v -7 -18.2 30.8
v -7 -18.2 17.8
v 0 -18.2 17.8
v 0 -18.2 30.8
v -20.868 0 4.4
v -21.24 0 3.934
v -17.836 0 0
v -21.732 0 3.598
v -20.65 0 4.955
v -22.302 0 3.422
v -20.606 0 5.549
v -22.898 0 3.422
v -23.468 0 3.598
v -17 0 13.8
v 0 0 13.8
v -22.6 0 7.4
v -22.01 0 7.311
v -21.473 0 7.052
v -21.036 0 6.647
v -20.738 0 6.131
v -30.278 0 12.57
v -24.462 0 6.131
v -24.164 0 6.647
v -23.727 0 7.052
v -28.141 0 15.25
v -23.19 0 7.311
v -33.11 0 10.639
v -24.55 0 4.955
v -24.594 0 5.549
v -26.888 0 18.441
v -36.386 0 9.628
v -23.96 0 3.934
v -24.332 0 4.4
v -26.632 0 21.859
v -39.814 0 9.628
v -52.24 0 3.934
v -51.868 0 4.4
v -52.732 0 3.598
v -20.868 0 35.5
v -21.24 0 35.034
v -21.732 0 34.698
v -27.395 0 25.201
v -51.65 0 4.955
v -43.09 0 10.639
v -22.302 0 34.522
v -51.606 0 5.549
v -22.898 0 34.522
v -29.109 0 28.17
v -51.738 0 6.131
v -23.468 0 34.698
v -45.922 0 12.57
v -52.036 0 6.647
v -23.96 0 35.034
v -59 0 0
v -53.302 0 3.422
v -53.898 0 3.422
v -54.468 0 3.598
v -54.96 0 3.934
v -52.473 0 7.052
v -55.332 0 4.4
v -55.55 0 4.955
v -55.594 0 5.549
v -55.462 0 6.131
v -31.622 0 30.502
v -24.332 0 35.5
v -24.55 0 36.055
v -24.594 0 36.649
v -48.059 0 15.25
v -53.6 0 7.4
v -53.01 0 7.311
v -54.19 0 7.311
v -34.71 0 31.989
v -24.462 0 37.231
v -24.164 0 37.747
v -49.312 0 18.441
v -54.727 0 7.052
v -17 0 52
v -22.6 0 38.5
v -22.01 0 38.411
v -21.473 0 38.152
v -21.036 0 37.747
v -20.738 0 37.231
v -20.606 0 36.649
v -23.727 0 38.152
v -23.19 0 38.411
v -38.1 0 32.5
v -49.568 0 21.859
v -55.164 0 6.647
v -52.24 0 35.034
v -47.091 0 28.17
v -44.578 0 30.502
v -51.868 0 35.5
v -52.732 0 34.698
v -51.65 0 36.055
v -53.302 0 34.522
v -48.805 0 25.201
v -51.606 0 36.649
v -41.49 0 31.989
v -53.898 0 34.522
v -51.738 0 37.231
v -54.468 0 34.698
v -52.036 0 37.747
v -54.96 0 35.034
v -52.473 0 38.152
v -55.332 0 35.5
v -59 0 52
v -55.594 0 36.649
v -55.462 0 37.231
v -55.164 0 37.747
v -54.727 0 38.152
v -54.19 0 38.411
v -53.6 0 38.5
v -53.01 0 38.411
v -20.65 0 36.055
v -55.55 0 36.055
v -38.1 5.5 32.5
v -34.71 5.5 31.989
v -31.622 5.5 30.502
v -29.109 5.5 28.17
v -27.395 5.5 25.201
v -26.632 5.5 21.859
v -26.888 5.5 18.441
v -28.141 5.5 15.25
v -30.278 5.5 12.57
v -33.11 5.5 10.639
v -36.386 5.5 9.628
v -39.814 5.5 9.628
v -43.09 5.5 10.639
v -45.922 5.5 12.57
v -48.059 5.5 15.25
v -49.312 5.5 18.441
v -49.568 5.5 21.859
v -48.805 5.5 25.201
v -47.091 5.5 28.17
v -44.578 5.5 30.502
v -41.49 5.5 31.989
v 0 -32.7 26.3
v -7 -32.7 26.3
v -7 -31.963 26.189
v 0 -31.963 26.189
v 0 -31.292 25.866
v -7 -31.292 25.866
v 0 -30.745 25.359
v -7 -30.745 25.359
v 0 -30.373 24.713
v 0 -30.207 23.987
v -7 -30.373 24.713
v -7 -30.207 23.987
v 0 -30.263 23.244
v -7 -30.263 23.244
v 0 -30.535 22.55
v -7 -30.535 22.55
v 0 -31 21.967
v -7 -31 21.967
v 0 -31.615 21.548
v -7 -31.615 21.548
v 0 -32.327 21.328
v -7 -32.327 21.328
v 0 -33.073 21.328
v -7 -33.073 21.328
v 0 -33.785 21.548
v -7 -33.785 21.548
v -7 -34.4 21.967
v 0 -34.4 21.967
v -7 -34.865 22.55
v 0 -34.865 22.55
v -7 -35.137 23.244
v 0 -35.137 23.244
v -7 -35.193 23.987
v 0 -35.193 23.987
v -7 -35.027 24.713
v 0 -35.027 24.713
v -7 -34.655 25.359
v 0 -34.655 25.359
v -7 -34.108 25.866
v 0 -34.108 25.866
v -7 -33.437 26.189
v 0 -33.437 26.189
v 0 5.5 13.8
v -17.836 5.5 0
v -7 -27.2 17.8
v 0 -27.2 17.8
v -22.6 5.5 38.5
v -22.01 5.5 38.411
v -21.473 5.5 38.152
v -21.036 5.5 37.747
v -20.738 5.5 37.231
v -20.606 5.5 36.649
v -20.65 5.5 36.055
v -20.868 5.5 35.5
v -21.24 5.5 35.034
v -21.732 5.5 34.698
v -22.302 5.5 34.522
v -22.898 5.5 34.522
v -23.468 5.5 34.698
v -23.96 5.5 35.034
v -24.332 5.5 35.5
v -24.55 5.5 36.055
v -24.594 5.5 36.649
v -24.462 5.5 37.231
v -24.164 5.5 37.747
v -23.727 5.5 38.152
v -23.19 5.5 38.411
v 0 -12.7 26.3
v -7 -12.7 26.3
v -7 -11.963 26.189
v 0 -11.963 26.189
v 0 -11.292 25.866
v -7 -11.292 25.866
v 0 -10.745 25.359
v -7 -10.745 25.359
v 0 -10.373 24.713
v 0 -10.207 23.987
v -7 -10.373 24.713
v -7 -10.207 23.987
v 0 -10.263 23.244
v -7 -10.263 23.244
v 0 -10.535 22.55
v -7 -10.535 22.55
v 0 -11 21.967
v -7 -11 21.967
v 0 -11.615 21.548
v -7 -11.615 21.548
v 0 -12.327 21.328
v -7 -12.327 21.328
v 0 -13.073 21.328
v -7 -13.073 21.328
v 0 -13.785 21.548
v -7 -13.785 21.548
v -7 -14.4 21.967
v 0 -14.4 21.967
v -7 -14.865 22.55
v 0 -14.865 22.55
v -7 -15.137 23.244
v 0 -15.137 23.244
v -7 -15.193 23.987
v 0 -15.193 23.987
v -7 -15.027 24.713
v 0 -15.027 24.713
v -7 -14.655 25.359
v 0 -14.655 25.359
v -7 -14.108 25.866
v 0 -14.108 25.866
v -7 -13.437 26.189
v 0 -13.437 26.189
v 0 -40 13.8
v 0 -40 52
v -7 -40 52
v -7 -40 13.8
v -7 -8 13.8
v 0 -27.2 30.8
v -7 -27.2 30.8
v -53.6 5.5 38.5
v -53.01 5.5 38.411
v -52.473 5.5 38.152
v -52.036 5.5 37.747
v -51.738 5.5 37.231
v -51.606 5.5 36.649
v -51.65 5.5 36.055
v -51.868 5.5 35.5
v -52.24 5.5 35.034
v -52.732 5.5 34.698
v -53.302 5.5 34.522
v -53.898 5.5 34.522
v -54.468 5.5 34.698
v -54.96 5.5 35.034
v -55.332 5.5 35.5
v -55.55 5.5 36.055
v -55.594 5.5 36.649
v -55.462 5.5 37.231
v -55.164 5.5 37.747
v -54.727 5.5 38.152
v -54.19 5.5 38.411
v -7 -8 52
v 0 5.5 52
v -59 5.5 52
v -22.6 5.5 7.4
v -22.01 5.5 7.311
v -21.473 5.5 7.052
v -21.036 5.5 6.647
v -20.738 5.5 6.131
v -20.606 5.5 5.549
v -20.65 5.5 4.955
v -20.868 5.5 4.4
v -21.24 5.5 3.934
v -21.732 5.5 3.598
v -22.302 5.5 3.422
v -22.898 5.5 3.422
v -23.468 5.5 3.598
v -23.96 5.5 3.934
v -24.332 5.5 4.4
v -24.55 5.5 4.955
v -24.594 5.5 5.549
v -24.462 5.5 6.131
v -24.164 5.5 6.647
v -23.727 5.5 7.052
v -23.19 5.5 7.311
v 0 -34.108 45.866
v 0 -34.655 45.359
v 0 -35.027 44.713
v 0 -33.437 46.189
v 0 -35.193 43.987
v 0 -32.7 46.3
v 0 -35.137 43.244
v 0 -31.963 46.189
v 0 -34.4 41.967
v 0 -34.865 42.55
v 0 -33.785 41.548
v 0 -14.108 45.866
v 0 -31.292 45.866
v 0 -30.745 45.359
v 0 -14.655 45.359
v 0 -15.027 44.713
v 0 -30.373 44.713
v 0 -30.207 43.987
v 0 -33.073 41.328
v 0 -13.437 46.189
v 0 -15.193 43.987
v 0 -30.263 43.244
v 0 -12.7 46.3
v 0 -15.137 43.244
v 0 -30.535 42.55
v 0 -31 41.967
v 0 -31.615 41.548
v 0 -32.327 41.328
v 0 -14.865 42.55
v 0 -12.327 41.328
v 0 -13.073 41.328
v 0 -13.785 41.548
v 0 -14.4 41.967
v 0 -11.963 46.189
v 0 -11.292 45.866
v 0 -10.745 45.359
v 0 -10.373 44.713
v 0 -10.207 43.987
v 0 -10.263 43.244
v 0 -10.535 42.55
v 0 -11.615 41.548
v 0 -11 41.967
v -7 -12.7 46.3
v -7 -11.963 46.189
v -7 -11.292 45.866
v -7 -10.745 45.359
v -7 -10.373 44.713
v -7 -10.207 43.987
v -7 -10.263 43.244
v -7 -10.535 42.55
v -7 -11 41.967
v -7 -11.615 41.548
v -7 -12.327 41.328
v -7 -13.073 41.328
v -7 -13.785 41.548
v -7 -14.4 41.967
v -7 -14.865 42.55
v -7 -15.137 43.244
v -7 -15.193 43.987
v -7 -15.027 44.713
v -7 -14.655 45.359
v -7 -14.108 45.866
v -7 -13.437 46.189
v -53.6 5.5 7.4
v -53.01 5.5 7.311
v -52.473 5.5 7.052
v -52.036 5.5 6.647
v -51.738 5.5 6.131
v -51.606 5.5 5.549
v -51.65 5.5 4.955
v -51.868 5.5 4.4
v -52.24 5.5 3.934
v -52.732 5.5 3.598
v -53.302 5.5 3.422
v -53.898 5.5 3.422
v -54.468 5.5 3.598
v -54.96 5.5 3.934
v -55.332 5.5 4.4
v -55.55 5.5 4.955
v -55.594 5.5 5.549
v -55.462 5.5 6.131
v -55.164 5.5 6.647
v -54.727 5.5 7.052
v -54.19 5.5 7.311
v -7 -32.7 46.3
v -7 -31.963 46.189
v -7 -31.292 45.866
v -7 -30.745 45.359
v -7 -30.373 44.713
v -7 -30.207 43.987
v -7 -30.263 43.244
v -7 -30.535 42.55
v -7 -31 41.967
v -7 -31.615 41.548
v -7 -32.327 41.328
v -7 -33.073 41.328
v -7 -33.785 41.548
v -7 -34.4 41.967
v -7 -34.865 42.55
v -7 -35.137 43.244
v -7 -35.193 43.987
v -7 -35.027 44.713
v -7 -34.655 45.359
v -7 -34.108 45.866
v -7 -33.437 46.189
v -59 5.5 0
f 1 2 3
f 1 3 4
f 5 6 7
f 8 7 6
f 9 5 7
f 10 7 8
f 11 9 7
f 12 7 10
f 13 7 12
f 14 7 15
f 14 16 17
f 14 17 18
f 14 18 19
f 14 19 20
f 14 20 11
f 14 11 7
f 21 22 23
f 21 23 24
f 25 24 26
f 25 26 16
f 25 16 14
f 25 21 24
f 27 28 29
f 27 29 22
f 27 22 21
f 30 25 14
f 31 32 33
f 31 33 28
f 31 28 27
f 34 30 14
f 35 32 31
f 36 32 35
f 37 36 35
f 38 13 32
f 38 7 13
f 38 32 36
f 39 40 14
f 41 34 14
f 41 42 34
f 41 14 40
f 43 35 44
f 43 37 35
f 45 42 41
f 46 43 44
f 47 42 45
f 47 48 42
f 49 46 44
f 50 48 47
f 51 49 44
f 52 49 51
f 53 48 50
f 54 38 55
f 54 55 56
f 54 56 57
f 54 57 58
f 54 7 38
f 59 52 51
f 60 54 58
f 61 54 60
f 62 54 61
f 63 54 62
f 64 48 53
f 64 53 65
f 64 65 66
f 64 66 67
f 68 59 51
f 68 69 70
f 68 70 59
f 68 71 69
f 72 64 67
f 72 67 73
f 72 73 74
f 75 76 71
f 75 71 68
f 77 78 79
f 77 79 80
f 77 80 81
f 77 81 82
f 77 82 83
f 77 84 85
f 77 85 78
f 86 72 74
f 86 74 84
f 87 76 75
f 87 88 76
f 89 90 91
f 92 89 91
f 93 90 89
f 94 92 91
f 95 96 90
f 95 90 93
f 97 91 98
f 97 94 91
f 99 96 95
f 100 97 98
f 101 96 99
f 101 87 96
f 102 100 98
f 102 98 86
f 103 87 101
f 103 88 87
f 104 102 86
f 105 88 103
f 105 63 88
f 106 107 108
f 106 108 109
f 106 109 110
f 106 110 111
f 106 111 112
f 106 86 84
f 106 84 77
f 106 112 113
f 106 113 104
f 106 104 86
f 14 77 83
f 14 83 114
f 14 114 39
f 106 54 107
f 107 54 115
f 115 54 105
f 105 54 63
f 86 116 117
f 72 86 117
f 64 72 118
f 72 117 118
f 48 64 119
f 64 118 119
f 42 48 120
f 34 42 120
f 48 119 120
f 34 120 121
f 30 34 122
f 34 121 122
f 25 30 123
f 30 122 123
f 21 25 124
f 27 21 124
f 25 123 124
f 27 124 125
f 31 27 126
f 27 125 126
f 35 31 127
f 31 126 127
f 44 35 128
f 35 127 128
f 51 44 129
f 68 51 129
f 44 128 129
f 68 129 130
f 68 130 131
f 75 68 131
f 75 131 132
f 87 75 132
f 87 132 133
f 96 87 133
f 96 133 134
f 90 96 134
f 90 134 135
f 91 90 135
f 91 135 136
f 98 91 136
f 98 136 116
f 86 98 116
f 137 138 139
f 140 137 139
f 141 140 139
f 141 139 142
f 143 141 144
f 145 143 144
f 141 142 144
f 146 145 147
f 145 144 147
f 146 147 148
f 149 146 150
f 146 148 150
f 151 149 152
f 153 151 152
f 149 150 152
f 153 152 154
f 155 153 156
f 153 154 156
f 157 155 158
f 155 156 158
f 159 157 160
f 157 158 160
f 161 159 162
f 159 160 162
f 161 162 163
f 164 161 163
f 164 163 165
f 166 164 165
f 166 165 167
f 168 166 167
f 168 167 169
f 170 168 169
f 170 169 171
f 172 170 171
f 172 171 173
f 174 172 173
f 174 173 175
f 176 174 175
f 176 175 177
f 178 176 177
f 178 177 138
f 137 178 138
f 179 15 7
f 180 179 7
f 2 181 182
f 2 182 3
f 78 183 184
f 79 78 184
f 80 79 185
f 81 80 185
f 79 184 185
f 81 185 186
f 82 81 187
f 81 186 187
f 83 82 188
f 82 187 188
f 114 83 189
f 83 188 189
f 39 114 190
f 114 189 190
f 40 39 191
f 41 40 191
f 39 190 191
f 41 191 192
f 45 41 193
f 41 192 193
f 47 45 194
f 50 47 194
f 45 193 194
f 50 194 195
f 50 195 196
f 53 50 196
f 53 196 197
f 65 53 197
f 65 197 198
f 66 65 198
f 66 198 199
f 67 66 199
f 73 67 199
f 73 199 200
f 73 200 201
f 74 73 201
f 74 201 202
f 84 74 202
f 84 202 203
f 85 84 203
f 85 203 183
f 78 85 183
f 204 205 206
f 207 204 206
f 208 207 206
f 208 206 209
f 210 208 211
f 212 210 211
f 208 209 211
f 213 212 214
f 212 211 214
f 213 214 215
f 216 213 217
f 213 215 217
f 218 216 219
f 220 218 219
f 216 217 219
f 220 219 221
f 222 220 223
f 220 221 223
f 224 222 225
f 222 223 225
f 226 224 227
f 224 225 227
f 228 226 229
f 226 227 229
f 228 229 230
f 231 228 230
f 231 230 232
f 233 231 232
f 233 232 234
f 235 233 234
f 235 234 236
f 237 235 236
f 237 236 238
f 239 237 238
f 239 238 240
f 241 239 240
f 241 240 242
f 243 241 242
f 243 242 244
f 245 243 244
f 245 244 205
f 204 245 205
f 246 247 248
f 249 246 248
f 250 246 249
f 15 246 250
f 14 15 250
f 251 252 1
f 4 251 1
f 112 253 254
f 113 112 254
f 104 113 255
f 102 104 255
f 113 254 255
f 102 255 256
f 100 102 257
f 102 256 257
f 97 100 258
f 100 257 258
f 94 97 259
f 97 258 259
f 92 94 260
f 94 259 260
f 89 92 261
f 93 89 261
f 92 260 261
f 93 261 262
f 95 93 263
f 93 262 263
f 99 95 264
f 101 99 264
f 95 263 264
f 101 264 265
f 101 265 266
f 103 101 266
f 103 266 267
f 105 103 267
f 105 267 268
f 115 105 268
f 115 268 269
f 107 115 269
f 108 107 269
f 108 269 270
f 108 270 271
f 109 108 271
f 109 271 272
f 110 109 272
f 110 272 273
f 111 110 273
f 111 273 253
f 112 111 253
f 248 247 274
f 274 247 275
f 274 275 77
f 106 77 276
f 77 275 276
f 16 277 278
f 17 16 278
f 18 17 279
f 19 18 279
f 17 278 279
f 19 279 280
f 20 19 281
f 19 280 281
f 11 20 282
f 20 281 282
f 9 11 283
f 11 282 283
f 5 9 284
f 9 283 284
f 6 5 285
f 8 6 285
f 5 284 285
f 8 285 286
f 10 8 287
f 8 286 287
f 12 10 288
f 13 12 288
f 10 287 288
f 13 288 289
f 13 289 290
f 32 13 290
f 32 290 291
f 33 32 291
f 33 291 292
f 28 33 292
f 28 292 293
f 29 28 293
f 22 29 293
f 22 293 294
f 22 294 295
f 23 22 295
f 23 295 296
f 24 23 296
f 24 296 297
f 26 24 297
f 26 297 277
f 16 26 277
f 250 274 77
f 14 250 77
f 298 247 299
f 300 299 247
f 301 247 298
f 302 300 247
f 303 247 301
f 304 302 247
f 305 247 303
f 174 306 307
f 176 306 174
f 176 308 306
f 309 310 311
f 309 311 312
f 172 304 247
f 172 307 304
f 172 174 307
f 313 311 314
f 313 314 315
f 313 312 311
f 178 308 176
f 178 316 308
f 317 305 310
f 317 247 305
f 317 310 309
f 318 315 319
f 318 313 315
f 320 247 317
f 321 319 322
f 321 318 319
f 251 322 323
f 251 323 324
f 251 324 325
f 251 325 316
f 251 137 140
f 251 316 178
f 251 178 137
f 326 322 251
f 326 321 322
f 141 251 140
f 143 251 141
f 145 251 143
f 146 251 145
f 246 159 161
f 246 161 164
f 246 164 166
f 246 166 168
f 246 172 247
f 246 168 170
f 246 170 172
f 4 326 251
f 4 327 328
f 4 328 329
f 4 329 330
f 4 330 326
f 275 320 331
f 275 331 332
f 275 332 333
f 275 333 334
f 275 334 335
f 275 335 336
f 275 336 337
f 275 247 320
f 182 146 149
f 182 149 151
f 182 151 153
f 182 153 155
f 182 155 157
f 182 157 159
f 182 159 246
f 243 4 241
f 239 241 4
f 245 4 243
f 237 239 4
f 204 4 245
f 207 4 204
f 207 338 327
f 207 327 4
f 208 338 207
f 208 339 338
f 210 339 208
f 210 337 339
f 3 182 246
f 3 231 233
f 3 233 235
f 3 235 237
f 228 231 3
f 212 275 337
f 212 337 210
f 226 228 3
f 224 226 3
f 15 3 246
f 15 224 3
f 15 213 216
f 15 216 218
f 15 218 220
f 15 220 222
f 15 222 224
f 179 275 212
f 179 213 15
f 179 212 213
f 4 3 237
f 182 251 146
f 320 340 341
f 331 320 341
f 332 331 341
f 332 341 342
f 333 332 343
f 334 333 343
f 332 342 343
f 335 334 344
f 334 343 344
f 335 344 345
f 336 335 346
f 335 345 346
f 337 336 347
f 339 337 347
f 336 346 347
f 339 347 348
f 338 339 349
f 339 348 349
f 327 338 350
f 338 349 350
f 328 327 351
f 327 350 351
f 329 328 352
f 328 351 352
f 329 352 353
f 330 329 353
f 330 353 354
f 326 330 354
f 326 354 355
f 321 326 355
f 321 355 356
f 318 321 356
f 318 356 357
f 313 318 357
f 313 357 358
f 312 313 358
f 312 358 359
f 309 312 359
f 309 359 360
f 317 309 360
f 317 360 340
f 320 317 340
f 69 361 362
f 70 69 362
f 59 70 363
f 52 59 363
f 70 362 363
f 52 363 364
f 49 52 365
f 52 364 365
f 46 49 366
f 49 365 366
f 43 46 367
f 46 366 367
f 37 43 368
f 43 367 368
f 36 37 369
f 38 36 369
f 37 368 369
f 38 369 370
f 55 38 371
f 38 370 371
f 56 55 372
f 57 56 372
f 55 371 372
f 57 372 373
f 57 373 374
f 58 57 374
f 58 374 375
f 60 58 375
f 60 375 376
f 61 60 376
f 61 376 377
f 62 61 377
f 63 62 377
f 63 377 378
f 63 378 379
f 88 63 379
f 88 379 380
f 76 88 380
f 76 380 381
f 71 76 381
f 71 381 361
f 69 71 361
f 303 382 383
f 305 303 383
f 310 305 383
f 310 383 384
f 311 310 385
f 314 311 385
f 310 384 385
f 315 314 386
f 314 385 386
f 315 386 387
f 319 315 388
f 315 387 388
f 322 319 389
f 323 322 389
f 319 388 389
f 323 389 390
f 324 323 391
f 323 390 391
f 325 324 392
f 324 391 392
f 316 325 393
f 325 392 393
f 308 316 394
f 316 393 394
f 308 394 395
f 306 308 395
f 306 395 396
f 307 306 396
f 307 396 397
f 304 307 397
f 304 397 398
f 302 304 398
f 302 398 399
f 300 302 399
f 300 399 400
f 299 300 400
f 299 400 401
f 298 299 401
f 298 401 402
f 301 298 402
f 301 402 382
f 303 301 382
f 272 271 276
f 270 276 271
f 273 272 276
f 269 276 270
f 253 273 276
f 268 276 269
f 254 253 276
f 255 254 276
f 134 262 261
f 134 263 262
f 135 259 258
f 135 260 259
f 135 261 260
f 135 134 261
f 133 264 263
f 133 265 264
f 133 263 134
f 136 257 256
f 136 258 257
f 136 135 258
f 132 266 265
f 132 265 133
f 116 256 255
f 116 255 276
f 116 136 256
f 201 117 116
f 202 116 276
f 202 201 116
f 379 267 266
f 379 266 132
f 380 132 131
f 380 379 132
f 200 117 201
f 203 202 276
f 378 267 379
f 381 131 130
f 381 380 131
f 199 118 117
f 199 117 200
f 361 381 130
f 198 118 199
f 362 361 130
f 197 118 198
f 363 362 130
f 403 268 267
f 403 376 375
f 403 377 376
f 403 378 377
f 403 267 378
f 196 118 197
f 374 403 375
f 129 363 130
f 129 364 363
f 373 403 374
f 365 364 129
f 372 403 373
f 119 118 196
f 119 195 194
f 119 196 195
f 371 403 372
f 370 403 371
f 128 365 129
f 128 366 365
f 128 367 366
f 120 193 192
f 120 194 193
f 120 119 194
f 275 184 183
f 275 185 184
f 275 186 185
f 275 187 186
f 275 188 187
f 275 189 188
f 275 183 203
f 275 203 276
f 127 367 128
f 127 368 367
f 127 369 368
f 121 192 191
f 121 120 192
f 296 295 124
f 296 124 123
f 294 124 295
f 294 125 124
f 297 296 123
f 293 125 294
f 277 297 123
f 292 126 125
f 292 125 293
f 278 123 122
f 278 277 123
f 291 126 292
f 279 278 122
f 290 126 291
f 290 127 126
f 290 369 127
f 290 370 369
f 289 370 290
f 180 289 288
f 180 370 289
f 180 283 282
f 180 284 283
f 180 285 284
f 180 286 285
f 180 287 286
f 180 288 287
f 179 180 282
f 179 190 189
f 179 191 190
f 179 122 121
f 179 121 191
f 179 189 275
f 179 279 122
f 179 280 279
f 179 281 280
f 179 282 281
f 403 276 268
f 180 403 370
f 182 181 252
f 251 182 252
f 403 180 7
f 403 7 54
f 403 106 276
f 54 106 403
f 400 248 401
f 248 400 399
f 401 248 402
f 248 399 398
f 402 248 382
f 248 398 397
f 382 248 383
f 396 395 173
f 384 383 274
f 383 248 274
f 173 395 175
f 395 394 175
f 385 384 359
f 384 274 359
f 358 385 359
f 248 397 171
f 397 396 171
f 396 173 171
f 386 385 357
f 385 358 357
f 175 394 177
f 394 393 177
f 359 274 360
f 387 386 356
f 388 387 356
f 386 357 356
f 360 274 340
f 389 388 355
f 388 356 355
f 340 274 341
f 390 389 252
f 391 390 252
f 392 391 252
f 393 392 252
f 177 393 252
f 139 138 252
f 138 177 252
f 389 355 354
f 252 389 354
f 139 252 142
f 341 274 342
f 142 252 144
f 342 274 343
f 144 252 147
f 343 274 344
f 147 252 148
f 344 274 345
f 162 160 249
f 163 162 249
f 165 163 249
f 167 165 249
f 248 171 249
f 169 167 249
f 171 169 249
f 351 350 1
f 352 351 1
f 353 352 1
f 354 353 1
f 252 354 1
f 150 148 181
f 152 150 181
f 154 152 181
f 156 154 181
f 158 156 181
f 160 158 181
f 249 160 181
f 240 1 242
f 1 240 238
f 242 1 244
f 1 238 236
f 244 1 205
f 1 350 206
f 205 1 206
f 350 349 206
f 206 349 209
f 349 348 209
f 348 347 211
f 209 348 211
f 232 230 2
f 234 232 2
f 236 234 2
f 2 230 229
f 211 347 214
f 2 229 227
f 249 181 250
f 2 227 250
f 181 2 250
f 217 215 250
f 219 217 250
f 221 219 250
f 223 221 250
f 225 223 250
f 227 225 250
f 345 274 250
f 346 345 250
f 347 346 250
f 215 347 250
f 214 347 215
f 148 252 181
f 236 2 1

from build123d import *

# Parameters (mm, degrees)
SKETCH1_W           = 59
SKETCH1_H           = 52
BOSS_EXTRUDE1_DEPTH = 5.5
SKETCH2_R           = 2
CUT_EXTRUDE1_DEPTH  = 10
SKETCH4_W           = 7
SKETCH4_H           = 52
BOSS_EXTRUDE3_DEPTH = 40
SKETCH5_R           = 2.5
CUT_EXTRUDE2_DEPTH  = 33
SKETCH6_W           = 13.8
SKETCH6_H           = 40
CUT_EXTRUDE3_DEPTH  = 33
CUT_EXTRUDE4_DEPTH  = 33
BOSS_EXTRUDE6_DEPTH = 38.2
SKETCH10_W          = 13
SKETCH10_H          = 9
CUT_EXTRUDE8_DEPTH  = 10
SKETCH11_R          = 11.5
CUT_EXTRUDE9_DEPTH  = 10


with BuildPart() as part:
    # Sketch1 → Boss-Extrude1 (new body)
    with BuildSketch(Plane(origin=(0, 0, 0), x_dir=(1, 0, 0), z_dir=(0, 1, 0))):
        with Locations((-29.5, -26)):
            Rectangle(SKETCH1_W, SKETCH1_H)
    extrude(amount=BOSS_EXTRUDE1_DEPTH)

    # Sketch2 → Cut-Extrude1 (cut)
    with BuildSketch(Plane(origin=(0, 5.5, 0), x_dir=(1, 0, 0), z_dir=(0, 1, 0))):
        with Locations(Location((-53.6, -5.4, 0), (0, 0, 270))):
            Circle(SKETCH2_R)
        with Locations(Location((-22.6, -5.4, 0), (0, 0, 270))):
            Circle(SKETCH2_R)
        with Locations(Location((-53.6, -36.5, 0), (0, 0, 270))):
            Circle(SKETCH2_R)
        with Locations(Location((-22.6, -36.5, 0), (0, 0, 270))):
            Circle(SKETCH2_R)
    extrude(amount=-CUT_EXTRUDE1_DEPTH, mode=Mode.SUBTRACT)

    # Sketch4 → Boss-Extrude3 (add)
    with BuildSketch(Plane(origin=(0, 0, 0), x_dir=(-1, 0, 0), z_dir=(0, -1, 0))):
        with Locations((3.5, -26)):
            Rectangle(SKETCH4_W, SKETCH4_H)
    extrude(amount=BOSS_EXTRUDE3_DEPTH)

    # Sketch5 → Cut-Extrude2 (cut)
    with BuildSketch(Plane.ZY.offset(7)):
        with Locations((43.8, -32.7)):
            Circle(SKETCH5_R)
        with Locations((43.8, -12.7)):
            Circle(SKETCH5_R)
        with Locations((23.8, -32.7)):
            Circle(SKETCH5_R)
        with Locations((23.8, -12.7)):
            Circle(SKETCH5_R)
    extrude(amount=-CUT_EXTRUDE2_DEPTH, mode=Mode.SUBTRACT)

    # Sketch6 → Cut-Extrude3 (cut)
    with BuildSketch(Plane.ZY.offset(7)):
        with Locations((6.9, -20)):
            Rectangle(SKETCH6_W, SKETCH6_H)
    extrude(amount=-CUT_EXTRUDE3_DEPTH, mode=Mode.SUBTRACT)

    # Sketch7 → Cut-Extrude4 (cut)
    with BuildSketch(Plane(origin=(0, 0, 0), x_dir=(-1, 0, 0), z_dir=(0, -1, 0))):
        Polygon((0, 0), (0, -13.8), (17.836375114, 0), align=None)
    extrude(amount=-CUT_EXTRUDE4_DEPTH, mode=Mode.SUBTRACT)

    # Sketch8 → Boss-Extrude6 (add)
    with BuildSketch(Plane.XY.offset(52)):
        Polygon((-7, 0), (-7, -8), (-17, 0), align=None)
    extrude(amount=-BOSS_EXTRUDE6_DEPTH)

    # Sketch10 → Cut-Extrude8 (cut)
    with BuildSketch(Plane.ZY.offset(7)):
        with Locations((24.3, -22.7)):
            Rectangle(SKETCH10_W, SKETCH10_H)
    extrude(amount=-CUT_EXTRUDE8_DEPTH, mode=Mode.SUBTRACT)

    # Sketch11 → Cut-Extrude9 (cut)
    with BuildSketch(Plane(origin=(0, 5.5, 0), x_dir=(1, 0, 0), z_dir=(0, 1, 0))):
        with Locations(Location((-38.1, -21, 0), (0, 0, 270))):
            Circle(SKETCH11_R)
    extrude(amount=-CUT_EXTRUDE9_DEPTH, mode=Mode.SUBTRACT)


solid = part.part
